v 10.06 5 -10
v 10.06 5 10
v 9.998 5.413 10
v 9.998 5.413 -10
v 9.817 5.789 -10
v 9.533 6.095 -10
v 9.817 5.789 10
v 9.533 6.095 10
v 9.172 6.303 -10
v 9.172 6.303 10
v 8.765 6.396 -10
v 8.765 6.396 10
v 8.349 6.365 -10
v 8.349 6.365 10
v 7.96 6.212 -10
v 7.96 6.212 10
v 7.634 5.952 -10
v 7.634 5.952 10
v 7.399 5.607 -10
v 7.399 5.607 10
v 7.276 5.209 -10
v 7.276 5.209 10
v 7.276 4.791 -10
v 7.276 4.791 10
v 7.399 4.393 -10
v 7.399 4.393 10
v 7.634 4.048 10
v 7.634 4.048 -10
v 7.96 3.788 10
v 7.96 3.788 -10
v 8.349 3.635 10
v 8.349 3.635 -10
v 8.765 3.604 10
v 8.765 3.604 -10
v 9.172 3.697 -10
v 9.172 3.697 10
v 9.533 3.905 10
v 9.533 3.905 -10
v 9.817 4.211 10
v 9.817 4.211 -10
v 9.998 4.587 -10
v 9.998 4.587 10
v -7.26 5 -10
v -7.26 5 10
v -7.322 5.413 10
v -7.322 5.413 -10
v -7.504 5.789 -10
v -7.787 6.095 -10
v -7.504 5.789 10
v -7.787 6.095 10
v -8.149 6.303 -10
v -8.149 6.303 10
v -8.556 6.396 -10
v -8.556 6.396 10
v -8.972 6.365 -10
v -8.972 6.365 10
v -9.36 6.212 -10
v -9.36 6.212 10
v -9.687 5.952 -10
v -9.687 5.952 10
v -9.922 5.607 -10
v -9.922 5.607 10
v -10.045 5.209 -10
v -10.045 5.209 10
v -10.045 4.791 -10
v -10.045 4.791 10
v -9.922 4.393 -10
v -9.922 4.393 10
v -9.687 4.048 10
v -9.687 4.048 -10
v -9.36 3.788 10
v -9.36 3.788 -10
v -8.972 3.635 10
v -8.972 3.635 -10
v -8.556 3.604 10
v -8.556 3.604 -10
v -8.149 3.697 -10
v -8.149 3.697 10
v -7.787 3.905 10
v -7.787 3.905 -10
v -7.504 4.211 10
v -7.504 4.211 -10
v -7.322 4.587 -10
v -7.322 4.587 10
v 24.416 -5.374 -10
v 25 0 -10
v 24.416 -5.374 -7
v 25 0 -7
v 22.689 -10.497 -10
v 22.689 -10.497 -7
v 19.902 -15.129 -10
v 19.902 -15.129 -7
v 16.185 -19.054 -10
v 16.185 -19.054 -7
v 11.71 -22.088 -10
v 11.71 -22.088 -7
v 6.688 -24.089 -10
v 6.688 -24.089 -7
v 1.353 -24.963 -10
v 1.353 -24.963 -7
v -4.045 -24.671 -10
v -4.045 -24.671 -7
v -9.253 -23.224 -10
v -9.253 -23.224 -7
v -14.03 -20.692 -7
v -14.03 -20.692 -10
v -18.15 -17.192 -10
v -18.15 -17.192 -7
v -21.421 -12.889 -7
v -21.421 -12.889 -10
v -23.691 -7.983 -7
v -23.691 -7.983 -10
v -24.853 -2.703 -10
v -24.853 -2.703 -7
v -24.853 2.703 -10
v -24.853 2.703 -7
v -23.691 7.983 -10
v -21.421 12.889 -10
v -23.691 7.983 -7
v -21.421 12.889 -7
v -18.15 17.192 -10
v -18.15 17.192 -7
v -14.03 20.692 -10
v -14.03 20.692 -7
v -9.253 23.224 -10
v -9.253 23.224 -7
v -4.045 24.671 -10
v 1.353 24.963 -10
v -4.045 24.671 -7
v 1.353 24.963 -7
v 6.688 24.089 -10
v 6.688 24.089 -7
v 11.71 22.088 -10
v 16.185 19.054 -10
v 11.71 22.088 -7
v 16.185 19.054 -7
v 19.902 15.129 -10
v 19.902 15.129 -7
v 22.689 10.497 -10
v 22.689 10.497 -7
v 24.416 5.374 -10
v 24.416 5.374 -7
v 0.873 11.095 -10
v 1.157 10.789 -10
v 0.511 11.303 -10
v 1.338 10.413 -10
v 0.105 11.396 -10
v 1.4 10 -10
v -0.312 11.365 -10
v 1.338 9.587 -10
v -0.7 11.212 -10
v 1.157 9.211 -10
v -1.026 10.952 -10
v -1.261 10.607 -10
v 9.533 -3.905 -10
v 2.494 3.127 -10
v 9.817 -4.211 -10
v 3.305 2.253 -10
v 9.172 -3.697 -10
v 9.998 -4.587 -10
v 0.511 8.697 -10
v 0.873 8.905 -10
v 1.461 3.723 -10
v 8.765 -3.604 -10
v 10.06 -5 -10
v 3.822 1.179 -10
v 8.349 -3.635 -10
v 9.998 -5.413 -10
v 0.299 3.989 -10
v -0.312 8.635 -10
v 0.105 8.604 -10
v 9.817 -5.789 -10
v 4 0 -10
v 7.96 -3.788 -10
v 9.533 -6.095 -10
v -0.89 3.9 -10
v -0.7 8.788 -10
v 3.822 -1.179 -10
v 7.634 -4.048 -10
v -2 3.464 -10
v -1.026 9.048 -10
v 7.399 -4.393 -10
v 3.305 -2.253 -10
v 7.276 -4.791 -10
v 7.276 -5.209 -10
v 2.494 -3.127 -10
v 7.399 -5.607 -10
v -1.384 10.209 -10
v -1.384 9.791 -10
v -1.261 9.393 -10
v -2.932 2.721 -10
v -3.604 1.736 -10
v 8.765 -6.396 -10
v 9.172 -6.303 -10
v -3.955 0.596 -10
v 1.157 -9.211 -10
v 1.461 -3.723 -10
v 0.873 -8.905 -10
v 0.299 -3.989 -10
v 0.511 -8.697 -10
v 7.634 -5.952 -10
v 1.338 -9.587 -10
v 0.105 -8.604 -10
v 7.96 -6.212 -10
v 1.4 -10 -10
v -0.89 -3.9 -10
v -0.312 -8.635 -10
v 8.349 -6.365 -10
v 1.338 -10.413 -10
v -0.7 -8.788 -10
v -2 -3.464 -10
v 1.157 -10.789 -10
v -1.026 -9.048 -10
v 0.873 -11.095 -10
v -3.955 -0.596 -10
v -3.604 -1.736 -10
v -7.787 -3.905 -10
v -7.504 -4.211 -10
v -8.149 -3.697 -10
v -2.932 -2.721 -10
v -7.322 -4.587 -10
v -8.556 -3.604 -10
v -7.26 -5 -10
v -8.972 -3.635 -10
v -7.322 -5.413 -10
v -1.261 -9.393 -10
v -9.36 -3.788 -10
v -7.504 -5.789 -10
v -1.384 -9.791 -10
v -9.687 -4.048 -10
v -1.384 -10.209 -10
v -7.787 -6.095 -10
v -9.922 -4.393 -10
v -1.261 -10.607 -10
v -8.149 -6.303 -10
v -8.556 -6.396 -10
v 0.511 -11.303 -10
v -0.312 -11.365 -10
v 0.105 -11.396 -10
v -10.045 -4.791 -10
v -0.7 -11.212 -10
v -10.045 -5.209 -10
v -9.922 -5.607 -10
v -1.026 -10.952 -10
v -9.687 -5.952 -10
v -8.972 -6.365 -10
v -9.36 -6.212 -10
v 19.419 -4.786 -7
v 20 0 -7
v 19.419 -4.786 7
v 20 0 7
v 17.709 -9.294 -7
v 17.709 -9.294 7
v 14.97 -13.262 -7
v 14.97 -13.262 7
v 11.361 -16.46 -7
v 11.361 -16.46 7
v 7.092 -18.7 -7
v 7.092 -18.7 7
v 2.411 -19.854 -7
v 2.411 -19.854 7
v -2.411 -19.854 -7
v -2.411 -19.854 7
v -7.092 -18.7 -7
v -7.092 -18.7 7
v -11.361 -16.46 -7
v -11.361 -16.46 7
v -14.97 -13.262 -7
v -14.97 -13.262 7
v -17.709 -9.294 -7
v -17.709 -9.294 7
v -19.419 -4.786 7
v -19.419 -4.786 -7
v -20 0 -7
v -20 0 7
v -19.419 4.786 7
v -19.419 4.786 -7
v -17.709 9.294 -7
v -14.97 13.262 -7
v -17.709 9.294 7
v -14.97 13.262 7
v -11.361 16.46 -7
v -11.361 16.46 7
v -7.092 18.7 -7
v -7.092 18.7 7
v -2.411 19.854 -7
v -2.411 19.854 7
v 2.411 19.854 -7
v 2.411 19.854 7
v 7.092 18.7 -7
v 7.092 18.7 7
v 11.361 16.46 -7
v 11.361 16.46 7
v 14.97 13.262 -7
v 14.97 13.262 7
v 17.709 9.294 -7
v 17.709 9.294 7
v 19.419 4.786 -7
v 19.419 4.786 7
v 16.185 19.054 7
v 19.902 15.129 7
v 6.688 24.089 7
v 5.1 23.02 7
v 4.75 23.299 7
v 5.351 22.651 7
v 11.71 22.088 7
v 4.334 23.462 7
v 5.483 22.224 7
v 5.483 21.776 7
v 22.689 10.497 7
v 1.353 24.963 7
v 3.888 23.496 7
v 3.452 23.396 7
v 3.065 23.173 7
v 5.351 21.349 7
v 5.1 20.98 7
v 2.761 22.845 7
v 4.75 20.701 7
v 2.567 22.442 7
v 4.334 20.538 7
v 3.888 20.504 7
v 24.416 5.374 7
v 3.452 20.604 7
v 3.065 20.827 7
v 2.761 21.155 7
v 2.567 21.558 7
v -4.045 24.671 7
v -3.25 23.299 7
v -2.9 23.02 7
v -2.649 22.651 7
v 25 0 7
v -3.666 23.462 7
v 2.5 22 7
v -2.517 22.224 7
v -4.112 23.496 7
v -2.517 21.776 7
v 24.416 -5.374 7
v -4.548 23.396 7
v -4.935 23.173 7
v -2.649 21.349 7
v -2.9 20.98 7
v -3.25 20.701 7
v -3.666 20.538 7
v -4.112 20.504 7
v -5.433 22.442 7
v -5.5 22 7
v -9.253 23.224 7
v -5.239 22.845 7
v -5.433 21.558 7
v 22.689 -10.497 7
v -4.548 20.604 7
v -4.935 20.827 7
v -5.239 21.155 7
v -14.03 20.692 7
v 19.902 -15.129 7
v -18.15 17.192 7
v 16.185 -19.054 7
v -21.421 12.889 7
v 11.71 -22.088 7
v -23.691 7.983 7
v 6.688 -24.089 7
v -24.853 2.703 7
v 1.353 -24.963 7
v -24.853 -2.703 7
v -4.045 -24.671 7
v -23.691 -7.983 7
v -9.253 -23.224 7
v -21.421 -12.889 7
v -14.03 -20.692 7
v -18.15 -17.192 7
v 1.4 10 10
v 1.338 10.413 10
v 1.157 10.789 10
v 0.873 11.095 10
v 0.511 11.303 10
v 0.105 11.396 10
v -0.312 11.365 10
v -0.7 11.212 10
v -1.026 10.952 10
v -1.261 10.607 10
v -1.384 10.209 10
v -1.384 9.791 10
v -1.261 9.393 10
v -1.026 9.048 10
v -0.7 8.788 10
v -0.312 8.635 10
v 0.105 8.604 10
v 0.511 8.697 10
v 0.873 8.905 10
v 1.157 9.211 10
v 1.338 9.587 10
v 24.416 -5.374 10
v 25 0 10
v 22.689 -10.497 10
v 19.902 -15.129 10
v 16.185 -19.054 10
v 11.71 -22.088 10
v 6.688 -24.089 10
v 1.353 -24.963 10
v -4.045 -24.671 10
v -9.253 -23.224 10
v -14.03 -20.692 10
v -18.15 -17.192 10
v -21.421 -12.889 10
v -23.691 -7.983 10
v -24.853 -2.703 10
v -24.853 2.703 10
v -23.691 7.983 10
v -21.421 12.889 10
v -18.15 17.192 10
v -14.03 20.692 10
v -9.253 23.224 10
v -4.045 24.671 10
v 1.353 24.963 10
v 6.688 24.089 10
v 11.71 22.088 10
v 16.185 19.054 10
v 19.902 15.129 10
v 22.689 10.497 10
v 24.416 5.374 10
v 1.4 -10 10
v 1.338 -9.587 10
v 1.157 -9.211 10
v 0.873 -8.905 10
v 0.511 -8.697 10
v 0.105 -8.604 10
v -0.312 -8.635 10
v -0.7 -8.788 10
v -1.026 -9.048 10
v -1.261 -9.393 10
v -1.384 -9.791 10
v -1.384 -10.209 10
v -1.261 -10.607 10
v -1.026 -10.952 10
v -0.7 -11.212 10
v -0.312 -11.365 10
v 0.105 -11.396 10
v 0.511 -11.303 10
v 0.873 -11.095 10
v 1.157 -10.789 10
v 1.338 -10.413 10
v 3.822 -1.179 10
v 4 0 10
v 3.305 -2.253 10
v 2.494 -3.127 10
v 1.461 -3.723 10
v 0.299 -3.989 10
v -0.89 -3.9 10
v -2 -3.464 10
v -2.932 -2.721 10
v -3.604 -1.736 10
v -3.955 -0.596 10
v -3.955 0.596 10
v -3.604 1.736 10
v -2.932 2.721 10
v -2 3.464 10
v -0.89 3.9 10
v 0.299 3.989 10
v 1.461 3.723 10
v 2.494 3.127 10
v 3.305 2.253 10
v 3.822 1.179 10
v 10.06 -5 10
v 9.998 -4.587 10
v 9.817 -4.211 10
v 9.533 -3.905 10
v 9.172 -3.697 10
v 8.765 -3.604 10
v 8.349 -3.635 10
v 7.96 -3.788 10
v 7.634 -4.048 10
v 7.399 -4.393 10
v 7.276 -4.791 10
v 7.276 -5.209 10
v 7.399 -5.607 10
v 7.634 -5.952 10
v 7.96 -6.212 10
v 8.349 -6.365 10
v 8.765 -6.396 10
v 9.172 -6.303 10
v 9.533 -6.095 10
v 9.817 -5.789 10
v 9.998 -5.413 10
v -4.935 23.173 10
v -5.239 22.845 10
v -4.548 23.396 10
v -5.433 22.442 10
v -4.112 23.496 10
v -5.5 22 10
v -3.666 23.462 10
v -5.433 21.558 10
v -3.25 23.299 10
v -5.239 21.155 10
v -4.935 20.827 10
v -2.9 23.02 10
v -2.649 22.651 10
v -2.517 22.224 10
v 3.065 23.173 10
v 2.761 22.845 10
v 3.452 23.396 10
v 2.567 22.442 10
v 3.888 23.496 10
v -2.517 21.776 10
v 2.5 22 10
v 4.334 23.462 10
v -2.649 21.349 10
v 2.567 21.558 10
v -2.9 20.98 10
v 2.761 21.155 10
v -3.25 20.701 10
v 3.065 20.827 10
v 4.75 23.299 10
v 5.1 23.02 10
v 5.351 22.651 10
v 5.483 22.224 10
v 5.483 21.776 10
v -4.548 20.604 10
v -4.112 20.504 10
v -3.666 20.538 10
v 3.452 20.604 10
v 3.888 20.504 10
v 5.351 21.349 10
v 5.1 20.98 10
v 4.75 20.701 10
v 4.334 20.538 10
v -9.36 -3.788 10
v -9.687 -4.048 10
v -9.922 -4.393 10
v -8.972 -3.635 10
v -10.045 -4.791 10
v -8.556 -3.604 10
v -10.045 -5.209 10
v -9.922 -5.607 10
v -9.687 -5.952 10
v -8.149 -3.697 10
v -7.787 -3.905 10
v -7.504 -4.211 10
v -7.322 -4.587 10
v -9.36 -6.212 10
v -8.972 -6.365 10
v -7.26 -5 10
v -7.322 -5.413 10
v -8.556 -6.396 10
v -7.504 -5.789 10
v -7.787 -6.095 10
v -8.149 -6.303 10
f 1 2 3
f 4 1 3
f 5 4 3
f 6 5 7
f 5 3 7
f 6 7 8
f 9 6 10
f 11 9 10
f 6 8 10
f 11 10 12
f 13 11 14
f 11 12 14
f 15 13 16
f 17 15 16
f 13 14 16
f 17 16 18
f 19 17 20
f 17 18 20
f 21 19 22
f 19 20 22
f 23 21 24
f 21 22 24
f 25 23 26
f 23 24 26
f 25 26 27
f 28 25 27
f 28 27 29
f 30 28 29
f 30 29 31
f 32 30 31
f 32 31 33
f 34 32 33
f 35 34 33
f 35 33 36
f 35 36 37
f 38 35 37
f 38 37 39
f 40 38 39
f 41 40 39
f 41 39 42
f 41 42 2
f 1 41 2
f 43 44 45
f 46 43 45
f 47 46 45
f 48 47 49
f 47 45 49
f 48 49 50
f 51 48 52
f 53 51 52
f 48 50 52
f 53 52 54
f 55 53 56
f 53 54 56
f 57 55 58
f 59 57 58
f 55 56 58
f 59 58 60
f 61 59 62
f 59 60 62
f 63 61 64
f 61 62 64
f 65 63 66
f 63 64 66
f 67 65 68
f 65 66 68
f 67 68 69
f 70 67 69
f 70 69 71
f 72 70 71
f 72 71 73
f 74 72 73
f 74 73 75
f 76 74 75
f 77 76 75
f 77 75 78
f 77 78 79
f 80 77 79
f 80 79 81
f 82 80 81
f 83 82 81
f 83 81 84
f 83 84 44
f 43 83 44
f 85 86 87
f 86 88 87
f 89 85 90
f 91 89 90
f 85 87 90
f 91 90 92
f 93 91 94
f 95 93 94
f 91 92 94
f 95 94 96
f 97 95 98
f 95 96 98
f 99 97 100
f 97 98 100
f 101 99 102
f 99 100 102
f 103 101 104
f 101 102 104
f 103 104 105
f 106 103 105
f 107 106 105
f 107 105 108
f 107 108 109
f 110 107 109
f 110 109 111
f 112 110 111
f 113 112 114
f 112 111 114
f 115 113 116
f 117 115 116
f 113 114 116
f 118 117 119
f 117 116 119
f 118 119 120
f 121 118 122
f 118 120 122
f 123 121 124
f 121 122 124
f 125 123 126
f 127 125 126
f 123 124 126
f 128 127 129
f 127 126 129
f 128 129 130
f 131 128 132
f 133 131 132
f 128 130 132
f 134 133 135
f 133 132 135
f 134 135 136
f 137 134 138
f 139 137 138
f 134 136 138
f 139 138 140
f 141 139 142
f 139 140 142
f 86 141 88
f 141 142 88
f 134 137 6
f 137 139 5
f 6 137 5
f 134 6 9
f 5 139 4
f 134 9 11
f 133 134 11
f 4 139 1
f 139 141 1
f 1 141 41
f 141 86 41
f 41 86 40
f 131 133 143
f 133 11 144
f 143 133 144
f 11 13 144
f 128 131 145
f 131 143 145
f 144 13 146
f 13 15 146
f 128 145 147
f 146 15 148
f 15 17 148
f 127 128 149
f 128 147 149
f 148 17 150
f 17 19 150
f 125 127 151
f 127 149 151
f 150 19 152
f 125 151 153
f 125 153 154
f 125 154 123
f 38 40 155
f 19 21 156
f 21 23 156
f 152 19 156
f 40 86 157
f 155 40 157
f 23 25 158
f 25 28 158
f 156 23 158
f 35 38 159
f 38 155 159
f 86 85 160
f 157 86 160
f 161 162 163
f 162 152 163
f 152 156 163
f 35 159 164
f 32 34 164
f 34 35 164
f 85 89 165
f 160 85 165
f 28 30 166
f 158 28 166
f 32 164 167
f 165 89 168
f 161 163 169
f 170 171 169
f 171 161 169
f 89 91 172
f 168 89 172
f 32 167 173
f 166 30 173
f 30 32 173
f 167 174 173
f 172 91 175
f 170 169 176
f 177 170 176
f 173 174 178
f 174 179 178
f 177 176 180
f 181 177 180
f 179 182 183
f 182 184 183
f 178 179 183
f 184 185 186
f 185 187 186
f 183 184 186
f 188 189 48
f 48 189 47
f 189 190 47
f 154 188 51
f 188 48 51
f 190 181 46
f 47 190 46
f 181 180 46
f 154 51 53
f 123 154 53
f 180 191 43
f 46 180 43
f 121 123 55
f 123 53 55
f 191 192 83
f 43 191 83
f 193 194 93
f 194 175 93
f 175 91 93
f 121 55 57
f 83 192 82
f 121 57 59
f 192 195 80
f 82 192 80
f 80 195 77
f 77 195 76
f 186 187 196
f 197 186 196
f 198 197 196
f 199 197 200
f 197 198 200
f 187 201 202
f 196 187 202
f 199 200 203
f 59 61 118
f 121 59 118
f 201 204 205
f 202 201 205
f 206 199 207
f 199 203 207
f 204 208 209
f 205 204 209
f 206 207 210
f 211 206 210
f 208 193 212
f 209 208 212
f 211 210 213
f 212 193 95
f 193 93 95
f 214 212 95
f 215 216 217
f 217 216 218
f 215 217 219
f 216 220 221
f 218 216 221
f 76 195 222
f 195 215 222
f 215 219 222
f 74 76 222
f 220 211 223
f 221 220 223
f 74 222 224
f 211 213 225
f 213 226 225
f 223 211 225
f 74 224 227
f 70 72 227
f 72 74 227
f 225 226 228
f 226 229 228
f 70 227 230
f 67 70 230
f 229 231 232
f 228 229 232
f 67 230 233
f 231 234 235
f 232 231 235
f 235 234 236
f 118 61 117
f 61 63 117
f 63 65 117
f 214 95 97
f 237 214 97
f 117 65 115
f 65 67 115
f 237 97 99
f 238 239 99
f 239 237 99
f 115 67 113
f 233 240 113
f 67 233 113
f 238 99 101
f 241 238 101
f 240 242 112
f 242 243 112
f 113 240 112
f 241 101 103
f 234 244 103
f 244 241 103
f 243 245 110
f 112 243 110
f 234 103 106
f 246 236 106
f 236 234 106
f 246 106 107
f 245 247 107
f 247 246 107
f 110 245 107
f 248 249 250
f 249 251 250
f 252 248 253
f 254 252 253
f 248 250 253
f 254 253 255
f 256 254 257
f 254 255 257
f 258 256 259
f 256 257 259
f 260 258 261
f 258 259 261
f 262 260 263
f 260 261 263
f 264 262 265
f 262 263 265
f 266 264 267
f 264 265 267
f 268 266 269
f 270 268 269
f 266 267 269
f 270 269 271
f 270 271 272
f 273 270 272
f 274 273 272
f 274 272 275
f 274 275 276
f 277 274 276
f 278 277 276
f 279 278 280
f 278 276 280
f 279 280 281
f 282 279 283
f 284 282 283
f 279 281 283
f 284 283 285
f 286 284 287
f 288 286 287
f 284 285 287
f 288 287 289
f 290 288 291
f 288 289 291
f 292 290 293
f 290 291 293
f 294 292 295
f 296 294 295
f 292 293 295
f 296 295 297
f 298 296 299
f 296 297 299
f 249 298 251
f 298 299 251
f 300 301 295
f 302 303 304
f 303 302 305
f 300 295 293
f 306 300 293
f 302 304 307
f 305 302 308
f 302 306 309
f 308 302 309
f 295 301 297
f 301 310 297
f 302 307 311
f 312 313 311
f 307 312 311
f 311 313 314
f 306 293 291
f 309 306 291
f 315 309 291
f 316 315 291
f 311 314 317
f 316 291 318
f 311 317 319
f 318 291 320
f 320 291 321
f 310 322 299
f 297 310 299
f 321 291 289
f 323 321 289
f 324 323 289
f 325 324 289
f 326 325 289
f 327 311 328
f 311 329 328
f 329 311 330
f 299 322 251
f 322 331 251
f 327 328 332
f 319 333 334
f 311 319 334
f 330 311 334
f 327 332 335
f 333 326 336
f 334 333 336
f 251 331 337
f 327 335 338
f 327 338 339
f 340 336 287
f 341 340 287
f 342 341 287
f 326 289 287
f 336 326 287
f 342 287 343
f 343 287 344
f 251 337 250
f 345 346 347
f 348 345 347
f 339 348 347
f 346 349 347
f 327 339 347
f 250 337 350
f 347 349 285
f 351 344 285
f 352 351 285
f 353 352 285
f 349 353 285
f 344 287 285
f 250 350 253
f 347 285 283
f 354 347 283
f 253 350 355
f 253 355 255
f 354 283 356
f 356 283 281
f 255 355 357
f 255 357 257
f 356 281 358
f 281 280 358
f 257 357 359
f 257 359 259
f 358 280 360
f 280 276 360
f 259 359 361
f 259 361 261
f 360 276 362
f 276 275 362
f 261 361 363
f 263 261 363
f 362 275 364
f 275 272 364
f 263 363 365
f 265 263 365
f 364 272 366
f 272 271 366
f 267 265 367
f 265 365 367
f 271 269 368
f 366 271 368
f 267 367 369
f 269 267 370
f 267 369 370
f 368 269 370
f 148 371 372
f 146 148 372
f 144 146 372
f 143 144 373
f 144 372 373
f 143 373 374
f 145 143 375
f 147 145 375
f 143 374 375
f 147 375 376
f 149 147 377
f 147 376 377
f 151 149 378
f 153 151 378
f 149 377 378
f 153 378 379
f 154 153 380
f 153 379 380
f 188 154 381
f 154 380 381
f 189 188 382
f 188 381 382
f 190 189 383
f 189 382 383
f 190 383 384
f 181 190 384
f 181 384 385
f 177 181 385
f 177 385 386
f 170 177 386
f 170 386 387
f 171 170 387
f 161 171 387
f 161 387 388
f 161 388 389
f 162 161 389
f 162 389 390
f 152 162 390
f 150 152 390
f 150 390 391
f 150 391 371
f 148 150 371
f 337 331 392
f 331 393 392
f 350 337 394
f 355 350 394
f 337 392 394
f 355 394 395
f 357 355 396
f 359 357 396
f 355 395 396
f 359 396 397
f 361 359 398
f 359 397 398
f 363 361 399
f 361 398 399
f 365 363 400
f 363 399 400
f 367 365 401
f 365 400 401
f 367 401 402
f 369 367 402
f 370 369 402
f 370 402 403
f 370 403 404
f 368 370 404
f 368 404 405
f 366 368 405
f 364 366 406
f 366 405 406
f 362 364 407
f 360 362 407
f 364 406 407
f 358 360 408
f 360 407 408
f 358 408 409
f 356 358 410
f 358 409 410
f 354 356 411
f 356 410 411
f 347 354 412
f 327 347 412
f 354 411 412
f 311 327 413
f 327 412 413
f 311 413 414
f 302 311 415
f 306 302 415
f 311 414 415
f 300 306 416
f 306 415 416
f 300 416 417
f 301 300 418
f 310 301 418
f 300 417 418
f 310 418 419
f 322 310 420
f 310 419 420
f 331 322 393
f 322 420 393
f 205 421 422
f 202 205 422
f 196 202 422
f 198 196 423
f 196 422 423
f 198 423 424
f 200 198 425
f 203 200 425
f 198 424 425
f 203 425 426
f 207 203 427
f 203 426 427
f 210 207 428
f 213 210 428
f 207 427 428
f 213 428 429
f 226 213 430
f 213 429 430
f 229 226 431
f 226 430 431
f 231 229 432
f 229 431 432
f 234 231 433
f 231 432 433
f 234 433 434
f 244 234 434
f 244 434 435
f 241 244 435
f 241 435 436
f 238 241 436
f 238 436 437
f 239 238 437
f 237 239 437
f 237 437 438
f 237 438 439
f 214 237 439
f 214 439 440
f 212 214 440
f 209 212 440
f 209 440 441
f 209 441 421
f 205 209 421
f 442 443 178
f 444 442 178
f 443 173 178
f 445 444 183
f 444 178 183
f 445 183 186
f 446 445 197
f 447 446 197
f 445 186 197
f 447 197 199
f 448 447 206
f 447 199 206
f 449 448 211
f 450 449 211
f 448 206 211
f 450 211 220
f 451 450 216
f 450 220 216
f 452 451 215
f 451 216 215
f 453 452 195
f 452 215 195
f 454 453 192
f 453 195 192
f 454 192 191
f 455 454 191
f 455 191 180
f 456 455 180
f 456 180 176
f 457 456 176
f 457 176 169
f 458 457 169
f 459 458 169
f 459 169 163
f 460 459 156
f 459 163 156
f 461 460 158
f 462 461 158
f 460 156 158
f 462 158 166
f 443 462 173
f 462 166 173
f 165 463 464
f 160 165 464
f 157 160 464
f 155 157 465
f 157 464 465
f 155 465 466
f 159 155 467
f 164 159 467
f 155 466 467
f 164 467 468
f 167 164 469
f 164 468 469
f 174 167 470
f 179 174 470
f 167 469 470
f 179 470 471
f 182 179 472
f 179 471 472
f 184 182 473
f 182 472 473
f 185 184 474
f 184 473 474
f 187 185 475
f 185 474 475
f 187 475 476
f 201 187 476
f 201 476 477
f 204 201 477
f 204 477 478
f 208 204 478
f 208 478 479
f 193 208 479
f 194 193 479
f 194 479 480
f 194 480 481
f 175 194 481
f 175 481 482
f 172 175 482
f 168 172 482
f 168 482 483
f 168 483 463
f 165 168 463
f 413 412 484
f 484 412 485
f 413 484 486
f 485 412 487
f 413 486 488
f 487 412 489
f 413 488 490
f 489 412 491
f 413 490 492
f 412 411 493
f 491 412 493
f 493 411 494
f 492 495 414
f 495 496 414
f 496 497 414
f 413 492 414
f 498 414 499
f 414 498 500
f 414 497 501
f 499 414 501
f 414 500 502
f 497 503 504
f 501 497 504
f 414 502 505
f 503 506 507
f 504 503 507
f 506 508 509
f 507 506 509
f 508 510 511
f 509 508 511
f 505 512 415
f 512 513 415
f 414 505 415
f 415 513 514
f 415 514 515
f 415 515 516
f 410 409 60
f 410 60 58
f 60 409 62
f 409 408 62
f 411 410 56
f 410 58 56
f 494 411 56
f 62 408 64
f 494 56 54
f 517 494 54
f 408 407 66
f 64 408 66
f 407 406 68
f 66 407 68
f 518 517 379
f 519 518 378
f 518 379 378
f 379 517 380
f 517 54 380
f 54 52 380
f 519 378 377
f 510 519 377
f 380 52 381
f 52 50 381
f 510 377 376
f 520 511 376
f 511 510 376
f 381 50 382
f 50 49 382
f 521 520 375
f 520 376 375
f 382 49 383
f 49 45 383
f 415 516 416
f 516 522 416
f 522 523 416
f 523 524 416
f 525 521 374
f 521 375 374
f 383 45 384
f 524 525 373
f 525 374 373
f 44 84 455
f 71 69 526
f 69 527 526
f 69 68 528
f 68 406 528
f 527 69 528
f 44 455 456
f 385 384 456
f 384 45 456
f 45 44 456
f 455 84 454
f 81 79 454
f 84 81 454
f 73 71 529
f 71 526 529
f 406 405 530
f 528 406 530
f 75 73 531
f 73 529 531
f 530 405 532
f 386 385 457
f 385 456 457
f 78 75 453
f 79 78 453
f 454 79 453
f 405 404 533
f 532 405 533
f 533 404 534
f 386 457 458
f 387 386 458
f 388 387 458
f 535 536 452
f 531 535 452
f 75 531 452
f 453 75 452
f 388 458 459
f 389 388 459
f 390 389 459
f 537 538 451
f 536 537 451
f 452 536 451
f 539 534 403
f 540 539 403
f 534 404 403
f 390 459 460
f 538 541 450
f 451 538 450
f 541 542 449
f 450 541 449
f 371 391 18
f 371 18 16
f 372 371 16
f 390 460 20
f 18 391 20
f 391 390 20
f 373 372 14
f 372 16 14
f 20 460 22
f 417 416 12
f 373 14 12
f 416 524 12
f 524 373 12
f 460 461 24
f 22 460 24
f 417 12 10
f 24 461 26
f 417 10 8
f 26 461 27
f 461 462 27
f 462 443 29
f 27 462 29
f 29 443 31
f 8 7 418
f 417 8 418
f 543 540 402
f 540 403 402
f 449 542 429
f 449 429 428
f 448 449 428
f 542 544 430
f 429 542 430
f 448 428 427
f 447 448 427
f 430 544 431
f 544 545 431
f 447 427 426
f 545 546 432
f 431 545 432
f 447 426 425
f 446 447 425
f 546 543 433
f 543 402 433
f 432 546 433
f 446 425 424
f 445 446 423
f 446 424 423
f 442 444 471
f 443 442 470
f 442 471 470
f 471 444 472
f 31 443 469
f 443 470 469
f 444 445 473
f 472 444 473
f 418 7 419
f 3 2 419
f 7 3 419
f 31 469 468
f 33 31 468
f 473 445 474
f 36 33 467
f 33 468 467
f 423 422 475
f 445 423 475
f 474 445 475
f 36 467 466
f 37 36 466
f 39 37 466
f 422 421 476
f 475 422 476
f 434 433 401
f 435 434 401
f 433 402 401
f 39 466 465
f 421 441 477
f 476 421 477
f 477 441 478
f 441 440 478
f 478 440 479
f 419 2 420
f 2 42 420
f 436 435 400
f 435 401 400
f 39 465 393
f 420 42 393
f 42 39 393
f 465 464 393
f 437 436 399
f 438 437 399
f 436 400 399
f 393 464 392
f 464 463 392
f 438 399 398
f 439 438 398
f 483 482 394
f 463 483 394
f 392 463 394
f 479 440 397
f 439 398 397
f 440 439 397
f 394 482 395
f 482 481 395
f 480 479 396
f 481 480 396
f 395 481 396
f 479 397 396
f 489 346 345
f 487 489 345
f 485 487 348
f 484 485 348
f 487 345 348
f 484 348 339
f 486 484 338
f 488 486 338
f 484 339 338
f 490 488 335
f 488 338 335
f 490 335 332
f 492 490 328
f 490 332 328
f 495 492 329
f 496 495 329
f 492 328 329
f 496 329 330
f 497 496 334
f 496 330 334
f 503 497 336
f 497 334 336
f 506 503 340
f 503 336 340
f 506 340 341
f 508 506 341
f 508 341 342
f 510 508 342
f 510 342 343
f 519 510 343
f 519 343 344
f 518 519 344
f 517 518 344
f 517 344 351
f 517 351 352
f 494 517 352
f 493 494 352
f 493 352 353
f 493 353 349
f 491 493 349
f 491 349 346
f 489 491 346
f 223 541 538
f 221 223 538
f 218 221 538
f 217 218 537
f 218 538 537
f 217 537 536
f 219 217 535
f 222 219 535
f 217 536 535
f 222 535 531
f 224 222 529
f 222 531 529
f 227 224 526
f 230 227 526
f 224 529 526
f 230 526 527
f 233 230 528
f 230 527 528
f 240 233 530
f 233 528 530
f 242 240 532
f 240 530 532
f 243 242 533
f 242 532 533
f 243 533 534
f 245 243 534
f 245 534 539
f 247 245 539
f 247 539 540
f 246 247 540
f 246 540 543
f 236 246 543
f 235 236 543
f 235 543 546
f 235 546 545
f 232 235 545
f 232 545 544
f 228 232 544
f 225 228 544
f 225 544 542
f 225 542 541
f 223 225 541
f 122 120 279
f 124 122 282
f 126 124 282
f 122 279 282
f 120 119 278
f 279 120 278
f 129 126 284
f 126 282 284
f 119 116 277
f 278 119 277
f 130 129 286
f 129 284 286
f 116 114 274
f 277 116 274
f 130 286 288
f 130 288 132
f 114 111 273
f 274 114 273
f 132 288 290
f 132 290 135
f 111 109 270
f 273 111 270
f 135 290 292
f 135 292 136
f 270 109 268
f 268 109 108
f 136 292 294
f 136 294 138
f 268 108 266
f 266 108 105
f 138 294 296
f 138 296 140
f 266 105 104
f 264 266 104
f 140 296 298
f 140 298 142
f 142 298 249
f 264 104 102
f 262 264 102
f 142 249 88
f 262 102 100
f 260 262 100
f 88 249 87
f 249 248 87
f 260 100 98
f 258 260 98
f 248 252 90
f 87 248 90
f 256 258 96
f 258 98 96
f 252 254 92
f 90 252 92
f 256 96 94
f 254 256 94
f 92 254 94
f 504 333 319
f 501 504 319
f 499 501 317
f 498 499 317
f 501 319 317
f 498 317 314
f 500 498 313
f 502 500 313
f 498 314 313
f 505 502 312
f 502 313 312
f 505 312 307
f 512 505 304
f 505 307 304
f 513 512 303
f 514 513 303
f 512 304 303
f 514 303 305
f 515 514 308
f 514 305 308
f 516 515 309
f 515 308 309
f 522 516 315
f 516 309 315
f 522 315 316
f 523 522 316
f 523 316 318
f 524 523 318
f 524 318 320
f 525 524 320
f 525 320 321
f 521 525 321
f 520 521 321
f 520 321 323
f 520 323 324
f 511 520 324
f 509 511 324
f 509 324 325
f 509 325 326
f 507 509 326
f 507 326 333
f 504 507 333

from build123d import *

# Parameters (mm, degrees)
SKETCH3_R          = 1.4
CUT_EXTRUDE1_DEPTH = 41.620192023
SKETCH5_R          = 1.5
CUT_EXTRUDE2_DEPTH = 40.230090492


with BuildPart() as part:
    # Sketch2 → Revolve1 (revolve)
    with BuildSketch(Plane(origin=(0, 0, 0), x_dir=(0, 0, -1), z_dir=(1, 0, 0))):
        Polygon((10, 4), (10, 25), (7, 25), (7, 20), (-7, 20), (-7, 25), (-10, 25), (-10, 4), align=None)
    revolve(axis=Axis((0, 0, 10), (0, 0, -1)))

    # Sketch3 → Cut-Extrude1 (cut, through all)
    with BuildSketch(Plane.XY.offset(10)):
        with Locations((0, 10)):
            Circle(SKETCH3_R)
        with Locations((8.660254038, 5)):
            Circle(SKETCH3_R)
        with Locations((8.660254038, -5)):
            Circle(SKETCH3_R)
        with Locations((0, -10)):
            Circle(SKETCH3_R)
        with Locations((-8.660254038, -5)):
            Circle(SKETCH3_R)
        with Locations((-8.660254038, 5)):
            Circle(SKETCH3_R)
    extrude(amount=-CUT_EXTRUDE1_DEPTH, mode=Mode.SUBTRACT)

    # Sketch5 → Cut-Extrude2 (cut, through all)
    with BuildSketch(Plane(origin=(0, 0, 7), x_dir=(-1, 0, 0), z_dir=(0, 0, -1))):
        with Locations((-4, 22)):
            Circle(SKETCH5_R)
        with Locations((4, 22)):
            Circle(SKETCH5_R)
    extrude(amount=-CUT_EXTRUDE2_DEPTH, mode=Mode.SUBTRACT)


solid = part.part
